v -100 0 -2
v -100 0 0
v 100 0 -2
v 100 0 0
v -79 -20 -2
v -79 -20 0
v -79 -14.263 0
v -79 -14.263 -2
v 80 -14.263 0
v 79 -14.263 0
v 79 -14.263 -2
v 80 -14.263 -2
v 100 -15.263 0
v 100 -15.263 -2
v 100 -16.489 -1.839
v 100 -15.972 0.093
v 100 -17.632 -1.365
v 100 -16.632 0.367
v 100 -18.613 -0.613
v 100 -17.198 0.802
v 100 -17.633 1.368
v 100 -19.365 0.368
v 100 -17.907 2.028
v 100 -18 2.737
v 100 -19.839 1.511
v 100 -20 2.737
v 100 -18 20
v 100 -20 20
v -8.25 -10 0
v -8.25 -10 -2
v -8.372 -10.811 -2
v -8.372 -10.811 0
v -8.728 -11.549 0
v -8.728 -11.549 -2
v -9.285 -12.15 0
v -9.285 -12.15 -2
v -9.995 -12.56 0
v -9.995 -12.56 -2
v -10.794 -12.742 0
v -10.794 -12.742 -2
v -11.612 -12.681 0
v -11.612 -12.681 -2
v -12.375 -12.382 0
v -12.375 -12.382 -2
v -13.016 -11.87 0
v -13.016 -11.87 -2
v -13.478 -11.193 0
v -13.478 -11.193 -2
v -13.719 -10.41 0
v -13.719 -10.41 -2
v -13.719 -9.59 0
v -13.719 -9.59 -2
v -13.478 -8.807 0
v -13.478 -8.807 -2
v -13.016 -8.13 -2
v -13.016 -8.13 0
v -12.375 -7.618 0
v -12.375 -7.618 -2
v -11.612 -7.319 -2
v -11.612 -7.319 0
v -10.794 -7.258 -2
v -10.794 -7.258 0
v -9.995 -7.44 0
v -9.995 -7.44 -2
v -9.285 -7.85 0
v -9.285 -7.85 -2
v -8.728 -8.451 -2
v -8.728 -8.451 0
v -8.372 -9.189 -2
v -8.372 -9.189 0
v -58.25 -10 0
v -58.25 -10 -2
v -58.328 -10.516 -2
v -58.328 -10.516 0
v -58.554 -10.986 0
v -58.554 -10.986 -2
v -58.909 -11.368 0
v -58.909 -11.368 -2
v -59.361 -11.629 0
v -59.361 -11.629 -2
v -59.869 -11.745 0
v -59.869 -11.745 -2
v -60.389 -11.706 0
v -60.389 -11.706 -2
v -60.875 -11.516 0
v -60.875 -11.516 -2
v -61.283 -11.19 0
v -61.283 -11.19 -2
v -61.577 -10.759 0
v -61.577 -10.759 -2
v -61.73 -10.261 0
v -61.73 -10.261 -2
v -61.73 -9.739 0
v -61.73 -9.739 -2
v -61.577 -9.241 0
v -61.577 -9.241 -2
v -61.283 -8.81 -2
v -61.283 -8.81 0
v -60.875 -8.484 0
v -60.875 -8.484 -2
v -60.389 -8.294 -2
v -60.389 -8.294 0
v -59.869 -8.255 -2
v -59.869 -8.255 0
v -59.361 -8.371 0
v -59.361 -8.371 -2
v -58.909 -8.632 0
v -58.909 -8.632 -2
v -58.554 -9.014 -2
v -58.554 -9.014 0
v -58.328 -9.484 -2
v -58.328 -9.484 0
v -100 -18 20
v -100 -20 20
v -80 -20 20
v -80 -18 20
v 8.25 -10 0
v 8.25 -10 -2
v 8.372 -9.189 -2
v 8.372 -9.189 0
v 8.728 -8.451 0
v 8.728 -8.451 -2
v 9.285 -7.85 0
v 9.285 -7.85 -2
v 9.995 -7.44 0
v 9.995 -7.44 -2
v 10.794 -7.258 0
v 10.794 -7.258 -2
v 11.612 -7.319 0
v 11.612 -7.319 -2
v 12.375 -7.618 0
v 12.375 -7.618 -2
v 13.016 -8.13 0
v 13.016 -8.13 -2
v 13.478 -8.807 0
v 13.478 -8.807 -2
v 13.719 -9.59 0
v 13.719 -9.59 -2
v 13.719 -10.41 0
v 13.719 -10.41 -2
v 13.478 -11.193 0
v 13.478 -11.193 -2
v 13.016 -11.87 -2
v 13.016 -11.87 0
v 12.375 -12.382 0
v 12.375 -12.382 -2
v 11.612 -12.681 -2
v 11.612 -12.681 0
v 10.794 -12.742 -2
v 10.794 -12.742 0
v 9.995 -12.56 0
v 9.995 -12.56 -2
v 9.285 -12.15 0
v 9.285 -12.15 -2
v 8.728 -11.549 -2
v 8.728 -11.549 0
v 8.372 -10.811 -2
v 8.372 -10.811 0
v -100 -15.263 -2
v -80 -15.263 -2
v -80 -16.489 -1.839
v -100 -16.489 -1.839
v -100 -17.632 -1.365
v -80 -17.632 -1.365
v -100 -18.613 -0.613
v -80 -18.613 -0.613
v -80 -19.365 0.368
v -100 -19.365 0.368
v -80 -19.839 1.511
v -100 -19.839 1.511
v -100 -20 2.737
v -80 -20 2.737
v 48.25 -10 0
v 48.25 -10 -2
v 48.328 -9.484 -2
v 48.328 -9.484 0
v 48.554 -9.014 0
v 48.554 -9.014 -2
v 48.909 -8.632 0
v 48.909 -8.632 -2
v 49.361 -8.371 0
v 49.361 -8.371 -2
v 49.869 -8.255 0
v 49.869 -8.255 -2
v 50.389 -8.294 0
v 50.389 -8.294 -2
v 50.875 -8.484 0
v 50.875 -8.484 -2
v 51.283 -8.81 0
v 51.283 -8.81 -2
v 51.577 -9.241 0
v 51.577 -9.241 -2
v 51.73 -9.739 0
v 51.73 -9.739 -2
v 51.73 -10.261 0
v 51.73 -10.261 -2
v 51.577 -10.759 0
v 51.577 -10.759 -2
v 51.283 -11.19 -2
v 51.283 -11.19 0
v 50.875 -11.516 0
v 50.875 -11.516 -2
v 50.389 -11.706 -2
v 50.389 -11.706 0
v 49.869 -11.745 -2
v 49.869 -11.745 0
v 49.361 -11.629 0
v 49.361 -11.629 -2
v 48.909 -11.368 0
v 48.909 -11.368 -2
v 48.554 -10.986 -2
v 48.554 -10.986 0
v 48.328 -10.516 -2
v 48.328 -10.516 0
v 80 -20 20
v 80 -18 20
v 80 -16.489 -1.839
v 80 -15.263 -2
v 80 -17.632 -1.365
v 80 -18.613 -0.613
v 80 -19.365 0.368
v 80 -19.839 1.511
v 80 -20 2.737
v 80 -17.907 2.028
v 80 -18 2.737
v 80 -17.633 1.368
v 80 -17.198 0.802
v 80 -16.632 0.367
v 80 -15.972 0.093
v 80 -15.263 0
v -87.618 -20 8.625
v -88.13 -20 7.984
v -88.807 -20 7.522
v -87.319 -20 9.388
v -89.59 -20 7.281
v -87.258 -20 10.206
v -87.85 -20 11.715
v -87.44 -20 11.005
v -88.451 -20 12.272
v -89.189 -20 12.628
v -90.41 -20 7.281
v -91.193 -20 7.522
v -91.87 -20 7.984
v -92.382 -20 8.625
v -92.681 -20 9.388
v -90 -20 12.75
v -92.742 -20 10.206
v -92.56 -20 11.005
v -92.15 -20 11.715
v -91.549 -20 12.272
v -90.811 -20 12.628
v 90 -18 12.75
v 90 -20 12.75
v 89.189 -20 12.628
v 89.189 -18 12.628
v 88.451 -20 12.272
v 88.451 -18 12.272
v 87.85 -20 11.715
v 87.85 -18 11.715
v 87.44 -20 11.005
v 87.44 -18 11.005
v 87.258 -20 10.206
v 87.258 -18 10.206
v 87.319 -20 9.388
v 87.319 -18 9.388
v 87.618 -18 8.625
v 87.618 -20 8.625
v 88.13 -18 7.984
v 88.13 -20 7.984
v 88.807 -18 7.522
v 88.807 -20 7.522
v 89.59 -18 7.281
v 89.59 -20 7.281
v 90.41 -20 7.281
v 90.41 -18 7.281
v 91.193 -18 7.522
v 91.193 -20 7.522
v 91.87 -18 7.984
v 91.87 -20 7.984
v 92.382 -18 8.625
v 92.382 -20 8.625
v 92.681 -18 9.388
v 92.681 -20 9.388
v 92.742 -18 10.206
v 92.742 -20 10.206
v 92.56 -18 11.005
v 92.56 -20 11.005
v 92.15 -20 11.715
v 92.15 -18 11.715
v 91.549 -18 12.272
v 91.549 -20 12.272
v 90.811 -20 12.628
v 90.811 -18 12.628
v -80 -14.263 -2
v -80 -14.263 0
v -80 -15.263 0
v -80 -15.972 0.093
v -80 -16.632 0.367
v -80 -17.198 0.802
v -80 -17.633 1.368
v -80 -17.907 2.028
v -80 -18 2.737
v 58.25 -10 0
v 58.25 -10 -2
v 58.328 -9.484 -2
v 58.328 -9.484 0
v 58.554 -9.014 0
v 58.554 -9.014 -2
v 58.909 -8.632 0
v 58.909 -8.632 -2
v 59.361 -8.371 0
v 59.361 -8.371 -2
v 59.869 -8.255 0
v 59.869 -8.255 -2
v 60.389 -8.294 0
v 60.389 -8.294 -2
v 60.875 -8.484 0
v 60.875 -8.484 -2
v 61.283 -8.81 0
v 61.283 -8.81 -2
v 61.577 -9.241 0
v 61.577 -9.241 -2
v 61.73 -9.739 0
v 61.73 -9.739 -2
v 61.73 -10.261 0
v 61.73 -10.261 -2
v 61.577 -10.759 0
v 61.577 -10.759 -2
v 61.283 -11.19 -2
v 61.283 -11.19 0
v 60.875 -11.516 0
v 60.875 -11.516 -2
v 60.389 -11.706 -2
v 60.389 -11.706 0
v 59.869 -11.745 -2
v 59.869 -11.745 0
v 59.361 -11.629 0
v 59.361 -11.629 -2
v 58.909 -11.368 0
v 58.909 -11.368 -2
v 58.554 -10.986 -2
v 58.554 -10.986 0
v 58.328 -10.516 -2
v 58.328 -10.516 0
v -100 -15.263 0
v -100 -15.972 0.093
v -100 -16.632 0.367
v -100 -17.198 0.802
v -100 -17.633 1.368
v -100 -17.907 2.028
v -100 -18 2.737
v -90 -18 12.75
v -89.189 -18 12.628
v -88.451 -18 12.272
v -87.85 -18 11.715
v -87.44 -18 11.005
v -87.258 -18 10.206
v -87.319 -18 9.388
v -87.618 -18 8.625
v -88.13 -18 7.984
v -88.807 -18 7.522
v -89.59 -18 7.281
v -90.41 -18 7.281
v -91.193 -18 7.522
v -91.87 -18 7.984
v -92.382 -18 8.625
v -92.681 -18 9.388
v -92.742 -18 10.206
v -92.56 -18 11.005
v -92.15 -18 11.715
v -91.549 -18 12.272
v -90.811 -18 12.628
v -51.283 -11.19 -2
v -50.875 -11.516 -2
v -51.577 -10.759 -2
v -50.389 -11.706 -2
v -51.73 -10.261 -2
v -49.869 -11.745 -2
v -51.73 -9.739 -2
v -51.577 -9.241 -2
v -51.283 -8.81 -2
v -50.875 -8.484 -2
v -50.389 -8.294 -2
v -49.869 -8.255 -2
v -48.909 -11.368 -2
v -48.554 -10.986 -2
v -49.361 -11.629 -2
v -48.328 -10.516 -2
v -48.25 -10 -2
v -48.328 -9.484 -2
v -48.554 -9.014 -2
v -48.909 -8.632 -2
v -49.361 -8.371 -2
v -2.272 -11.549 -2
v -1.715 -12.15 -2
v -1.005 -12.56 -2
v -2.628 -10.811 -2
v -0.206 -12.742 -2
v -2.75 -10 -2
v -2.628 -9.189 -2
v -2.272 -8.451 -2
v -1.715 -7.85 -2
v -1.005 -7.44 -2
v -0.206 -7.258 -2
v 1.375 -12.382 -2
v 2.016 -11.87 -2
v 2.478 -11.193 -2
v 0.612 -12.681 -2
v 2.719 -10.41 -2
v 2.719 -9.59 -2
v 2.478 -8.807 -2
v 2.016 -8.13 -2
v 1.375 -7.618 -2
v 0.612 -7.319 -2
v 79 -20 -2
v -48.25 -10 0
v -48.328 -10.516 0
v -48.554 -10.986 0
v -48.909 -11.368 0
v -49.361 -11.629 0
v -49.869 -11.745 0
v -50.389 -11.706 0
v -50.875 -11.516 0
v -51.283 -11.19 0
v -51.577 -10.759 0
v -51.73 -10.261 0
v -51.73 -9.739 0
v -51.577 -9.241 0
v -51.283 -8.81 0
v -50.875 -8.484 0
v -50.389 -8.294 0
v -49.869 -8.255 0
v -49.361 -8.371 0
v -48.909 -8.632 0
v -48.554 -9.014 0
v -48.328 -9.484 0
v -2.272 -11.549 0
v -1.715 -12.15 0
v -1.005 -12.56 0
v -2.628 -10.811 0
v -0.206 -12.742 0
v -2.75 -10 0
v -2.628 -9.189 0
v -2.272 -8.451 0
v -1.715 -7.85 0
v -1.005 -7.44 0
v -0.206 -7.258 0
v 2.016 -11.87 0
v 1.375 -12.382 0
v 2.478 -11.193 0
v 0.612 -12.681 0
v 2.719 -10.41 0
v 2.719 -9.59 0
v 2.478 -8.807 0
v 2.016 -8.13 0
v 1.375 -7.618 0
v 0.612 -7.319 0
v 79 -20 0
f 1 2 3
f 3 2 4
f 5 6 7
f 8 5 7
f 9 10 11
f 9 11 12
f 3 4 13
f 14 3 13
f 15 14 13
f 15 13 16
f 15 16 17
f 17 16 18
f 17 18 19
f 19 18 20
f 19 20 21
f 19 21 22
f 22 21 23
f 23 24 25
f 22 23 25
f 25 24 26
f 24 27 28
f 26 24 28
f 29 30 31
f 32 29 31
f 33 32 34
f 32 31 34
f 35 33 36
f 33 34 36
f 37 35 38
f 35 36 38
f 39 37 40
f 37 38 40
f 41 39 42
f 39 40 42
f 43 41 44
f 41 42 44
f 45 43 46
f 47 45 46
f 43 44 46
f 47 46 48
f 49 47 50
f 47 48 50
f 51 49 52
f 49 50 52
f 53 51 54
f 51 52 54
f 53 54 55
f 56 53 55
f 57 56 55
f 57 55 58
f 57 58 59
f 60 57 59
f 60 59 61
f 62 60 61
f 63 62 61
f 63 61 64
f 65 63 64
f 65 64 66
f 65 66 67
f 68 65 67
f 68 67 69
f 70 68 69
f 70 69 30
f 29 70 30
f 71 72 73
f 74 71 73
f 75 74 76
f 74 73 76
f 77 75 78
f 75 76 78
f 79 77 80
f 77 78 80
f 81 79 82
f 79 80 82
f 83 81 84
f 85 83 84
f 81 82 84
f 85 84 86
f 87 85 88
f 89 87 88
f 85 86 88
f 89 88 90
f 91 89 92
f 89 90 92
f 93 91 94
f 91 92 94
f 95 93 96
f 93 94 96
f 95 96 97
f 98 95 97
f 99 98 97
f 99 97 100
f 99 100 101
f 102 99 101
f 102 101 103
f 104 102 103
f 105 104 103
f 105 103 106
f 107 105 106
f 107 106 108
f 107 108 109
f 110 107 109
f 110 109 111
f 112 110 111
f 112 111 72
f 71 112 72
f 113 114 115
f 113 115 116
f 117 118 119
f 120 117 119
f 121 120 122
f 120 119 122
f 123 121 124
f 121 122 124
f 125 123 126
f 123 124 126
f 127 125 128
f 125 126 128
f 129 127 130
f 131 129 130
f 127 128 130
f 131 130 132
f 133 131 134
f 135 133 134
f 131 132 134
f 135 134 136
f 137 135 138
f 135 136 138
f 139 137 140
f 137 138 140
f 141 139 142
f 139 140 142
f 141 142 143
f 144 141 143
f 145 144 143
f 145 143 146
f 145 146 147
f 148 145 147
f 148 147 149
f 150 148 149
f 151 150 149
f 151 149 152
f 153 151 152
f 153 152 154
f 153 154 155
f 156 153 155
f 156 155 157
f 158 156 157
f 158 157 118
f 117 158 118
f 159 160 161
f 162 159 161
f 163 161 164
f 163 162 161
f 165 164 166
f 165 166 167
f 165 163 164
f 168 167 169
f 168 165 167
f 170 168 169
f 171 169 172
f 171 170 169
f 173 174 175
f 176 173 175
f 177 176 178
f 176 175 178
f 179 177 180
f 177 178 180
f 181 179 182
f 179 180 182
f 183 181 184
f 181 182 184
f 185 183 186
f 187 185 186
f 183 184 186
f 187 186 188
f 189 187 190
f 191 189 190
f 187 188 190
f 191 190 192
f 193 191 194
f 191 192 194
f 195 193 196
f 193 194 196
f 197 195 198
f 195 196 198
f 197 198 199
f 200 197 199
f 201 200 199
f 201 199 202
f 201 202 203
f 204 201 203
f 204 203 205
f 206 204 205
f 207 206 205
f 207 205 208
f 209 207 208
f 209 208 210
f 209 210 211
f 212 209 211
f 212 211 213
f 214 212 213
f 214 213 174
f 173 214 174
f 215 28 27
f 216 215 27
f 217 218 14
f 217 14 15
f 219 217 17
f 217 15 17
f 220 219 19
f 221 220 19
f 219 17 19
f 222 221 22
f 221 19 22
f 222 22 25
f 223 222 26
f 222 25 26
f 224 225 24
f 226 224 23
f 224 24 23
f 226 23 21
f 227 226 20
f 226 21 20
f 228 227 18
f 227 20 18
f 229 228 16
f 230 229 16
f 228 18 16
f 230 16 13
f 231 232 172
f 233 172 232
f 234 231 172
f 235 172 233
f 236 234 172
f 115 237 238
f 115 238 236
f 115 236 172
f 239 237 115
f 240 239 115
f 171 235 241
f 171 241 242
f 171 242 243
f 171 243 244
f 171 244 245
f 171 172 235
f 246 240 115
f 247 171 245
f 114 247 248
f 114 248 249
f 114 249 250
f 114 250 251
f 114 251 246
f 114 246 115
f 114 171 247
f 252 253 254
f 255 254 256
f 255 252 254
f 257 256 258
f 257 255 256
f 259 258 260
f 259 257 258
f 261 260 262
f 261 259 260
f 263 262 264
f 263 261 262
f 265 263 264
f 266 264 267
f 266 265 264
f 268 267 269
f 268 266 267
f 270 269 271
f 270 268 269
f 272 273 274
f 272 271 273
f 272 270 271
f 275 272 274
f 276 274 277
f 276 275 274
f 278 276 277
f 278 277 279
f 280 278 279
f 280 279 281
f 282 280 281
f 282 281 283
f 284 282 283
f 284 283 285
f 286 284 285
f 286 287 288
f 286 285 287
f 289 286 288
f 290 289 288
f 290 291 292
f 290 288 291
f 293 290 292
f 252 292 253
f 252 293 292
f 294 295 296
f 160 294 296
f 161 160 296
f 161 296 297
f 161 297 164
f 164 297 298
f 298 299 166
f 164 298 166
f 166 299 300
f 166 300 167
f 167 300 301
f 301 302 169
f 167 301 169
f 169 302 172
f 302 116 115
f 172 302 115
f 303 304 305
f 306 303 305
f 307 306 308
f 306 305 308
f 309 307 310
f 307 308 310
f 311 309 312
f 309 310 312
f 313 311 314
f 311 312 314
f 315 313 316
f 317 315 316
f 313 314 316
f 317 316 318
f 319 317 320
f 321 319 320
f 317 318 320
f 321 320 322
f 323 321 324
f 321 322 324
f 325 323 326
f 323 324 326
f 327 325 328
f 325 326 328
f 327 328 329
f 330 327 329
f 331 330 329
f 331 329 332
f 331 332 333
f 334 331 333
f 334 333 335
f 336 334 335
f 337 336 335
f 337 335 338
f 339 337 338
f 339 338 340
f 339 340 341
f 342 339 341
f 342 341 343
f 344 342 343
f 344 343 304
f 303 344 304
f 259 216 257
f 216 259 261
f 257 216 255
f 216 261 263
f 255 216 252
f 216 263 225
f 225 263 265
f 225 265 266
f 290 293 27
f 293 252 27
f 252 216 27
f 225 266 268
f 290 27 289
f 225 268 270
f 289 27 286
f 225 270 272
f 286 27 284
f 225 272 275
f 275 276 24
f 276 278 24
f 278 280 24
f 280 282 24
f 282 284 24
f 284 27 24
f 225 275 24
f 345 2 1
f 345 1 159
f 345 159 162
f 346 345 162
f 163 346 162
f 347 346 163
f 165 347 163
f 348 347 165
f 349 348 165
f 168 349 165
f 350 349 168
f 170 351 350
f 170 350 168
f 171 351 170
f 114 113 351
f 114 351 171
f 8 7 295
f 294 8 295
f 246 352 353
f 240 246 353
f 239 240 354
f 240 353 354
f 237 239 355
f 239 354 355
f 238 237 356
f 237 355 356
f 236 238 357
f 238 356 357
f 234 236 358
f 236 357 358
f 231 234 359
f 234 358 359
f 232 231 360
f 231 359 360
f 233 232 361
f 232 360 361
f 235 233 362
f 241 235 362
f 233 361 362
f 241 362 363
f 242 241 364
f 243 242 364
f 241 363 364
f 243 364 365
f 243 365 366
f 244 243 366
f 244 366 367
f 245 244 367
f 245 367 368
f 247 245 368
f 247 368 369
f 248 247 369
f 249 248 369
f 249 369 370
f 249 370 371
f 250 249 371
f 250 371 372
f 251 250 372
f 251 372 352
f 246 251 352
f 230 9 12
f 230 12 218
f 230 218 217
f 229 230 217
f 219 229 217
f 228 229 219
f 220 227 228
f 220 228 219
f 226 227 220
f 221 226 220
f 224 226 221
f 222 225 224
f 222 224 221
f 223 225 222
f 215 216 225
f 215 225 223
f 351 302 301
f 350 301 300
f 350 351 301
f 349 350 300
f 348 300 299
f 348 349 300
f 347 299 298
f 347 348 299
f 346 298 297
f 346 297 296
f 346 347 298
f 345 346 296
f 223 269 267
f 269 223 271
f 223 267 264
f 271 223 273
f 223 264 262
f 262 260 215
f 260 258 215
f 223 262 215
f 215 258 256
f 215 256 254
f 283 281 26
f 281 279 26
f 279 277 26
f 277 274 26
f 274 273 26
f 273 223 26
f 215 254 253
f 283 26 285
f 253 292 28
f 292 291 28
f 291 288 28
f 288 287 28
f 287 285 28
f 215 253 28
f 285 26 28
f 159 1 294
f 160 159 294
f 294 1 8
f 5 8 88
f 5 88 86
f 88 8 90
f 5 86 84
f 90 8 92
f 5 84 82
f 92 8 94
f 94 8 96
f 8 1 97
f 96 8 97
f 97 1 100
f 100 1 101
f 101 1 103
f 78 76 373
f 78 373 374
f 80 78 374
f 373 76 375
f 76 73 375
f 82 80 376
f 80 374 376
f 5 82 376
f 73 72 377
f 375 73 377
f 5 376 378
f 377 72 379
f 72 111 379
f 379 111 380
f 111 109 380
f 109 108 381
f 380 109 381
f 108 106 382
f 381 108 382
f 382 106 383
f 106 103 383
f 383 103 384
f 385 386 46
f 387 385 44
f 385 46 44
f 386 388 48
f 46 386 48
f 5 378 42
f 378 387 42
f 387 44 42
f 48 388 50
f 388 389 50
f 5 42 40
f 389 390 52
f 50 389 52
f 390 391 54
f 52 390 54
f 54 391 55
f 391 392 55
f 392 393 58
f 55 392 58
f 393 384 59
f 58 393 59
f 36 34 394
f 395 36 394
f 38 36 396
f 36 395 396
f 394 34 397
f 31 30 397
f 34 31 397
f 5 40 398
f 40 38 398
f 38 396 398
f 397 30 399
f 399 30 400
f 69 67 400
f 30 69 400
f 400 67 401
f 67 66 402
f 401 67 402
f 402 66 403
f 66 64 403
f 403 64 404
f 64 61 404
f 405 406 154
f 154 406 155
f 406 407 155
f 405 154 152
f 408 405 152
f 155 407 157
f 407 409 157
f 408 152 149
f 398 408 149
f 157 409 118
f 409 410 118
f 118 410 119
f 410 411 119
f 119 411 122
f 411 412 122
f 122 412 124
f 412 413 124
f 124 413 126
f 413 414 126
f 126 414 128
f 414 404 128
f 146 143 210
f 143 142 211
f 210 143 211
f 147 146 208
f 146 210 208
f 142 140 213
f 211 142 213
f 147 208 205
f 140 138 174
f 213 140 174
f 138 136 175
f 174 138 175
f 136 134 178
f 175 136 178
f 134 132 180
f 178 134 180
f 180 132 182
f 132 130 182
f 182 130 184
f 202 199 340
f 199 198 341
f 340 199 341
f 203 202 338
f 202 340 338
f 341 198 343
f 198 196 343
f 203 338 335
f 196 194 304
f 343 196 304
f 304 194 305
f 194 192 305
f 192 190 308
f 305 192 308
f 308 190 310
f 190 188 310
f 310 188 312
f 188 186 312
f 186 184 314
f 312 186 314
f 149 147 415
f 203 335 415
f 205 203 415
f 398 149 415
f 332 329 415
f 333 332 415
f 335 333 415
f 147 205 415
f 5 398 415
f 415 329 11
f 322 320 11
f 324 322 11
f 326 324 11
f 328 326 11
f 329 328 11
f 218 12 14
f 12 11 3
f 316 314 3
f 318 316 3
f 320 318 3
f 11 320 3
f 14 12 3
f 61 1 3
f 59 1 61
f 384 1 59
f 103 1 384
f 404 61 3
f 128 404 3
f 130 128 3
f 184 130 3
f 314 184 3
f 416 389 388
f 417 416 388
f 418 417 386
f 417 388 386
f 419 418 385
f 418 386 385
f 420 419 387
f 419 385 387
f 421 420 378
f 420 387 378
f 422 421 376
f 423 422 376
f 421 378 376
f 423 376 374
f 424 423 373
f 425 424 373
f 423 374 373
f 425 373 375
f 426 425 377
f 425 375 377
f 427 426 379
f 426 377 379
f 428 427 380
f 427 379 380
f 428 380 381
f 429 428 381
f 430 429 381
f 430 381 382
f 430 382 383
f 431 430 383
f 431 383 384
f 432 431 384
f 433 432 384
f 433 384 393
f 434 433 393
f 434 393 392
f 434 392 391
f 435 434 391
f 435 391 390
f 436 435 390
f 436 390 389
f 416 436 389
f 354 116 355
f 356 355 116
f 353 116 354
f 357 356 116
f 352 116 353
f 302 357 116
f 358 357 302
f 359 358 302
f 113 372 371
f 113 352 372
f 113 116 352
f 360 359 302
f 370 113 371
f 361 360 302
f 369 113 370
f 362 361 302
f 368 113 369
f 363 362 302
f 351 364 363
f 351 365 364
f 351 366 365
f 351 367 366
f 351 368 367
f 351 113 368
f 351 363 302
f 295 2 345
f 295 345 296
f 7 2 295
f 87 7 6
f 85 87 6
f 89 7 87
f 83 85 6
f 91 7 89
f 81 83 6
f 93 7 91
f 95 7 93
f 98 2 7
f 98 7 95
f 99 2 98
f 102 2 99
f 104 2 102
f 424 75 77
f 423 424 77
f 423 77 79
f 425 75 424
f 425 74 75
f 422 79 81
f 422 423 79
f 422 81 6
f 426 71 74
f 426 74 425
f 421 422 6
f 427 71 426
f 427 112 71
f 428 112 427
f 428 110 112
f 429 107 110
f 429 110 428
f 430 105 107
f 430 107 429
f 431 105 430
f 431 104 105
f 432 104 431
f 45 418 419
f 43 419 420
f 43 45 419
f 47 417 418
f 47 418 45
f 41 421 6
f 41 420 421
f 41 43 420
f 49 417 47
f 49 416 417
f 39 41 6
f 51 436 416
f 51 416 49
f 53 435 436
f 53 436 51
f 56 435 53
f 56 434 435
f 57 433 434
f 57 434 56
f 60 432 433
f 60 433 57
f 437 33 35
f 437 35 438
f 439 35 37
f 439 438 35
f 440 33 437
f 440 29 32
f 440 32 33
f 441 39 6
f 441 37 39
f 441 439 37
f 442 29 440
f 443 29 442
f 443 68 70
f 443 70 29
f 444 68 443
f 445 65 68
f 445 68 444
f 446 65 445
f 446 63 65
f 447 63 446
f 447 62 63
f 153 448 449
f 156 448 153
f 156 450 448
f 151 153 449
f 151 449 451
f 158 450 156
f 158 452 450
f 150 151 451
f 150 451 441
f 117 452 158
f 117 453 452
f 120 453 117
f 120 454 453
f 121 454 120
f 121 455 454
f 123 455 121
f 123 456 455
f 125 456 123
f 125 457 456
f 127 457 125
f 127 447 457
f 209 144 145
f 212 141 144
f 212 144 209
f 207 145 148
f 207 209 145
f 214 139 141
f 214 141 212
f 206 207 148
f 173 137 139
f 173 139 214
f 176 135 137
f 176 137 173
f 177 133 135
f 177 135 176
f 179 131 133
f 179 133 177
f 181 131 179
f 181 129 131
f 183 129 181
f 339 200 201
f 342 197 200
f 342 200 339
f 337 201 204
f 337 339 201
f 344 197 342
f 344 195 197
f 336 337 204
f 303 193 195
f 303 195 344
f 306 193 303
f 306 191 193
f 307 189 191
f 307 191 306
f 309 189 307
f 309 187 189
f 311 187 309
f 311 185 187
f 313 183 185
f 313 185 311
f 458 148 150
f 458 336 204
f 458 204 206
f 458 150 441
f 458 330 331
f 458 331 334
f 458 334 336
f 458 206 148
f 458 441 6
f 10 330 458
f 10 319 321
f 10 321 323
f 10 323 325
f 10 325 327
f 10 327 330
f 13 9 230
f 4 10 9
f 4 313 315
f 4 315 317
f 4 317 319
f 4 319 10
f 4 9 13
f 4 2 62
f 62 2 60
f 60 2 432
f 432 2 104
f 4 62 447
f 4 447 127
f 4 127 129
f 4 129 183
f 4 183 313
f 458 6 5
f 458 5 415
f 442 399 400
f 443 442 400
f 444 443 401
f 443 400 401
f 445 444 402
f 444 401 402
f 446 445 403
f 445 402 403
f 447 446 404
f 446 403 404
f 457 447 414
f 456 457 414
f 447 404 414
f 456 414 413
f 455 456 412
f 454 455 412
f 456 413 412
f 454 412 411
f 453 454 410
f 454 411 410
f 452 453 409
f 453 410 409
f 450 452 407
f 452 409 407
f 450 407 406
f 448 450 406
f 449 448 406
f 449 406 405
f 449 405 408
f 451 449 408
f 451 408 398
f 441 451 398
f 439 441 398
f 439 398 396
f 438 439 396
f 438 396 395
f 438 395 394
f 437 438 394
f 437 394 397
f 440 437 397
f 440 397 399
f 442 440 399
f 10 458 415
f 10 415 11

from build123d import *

# Parameters (mm, degrees)
SKETCH_1_W                        = 200
SKETCH_1_H                        = 20
SM_BASE_FLANGE_1_DEPTH            = 2
SM_EDGE_FLANGE_1_STRIP_W          = 13.4732
SM_EDGE_FLANGE_1_STRIP_H          = 2
SM_EDGE_FLANGE_1_STRIP_CUT_DEPTH  = 20
SM_EDGE_FLANGE_1_RELIEF_W         = 14.4732
SM_EDGE_FLANGE_1_RELIEF_H         = 1
SM_EDGE_FLANGE_1_RELIEF_CUT_DEPTH = 2
SM_EDGE_FLANGE_1_DEPTH            = 20
SKETCH_10_R                       = 2.75
CUT_EXTRUDE_2_DEPTH               = 10
SKETCH_11_R                       = 2.75
SKETCH_11_R_2                     = 1.75
CUT_EXTRUDE_3_DEPTH               = 10


# Sheet-metal steps are written as plain solids
with BuildPart() as part:
    # Sketch 1 → 基体-法兰1 (new body)
    with BuildSketch(Plane.XY):
        with Locations((0, -10)):
            Rectangle(SKETCH_1_W, SKETCH_1_H)
    extrude(amount=-SM_BASE_FLANGE_1_DEPTH)

    # 边线-法兰1 strip (across the edge) → 边线-法兰1 strip cut (cut)
    with BuildSketch(Plane(origin=(-100, -20, 0), x_dir=(0, 1, 0), z_dir=(1, 0, 0))):
        with Locations((-2, -1)):
            Rectangle(SM_EDGE_FLANGE_1_STRIP_W, SM_EDGE_FLANGE_1_STRIP_H)
    sm_edge_flange_1_strip_cut = extrude(amount=SM_EDGE_FLANGE_1_STRIP_CUT_DEPTH, mode=Mode.SUBTRACT)

    # 边线-法兰1 relief (on the sheet) → 边线-法兰1 relief cut (cut)
    with BuildSketch(Plane(origin=(-100, -15.2634, 0), x_dir=(0, 1, 0), z_dir=(0, 0, 1))):
        with Locations((-6.2366, -20.5)):
            Rectangle(SM_EDGE_FLANGE_1_RELIEF_W, SM_EDGE_FLANGE_1_RELIEF_H)
    sm_edge_flange_1_relief_cut = extrude(amount=-SM_EDGE_FLANGE_1_RELIEF_CUT_DEPTH, mode=Mode.SUBTRACT)

    # 边线-法兰1 section (across the edge) → 边线-法兰1 (add)
    with BuildSketch(Plane(origin=(-100, -20, 0), x_dir=(0, 1, 0), z_dir=(1, 0, 0))):
        with BuildLine():
            Line((0, 2.7366), (0, 20))
            Line((0, 20), (2, 20))
            Line((2, 20), (2, 2.7366))
            ThreePointArc((2, 2.7366), (2.801531583, 0.801531583), (4.7366, 0))
            Line((4.7366, 0), (4.7366, -2))
            ThreePointArc((4.7366, -2), (1.38731802, -0.61268198), (0, 2.7366))
        make_face()
    sm_edge_flange_1 = extrude(amount=SM_EDGE_FLANGE_1_DEPTH)

    # 草图10 → 切除-拉伸2 (cut)
    with BuildSketch(Plane(origin=(0, -18, 0), x_dir=(1, 0, 0), z_dir=(0, 1, 0))):
        with Locations(Location((-90, -10, 0), (0, 0, 270))):
            Circle(SKETCH_10_R)
    cut_extrude_2 = extrude(amount=-CUT_EXTRUDE_2_DEPTH, mode=Mode.SUBTRACT)

    # 镜向1: 边线-法兰1 strip cut, 边线-法兰1 relief cut, 边线-法兰1, 切除-拉伸2 across plane
    add(sm_edge_flange_1_strip_cut.mirror(Plane(origin=(0, 0, 0), x_dir=(0, 0, 1), z_dir=(1, 0, 0))), mode=Mode.SUBTRACT)
    add(sm_edge_flange_1_relief_cut.mirror(Plane(origin=(0, 0, 0), x_dir=(0, 0, 1), z_dir=(1, 0, 0))), mode=Mode.SUBTRACT)
    add(sm_edge_flange_1.mirror(Plane(origin=(0, 0, 0), x_dir=(0, 0, 1), z_dir=(1, 0, 0))))
    add(cut_extrude_2.mirror(Plane(origin=(0, 0, 0), x_dir=(0, 0, 1), z_dir=(1, 0, 0))), mode=Mode.SUBTRACT)

    # 草图11 → 切除-拉伸3 (cut)
    with BuildSketch(Plane(origin=(0, 0, -2), x_dir=(-1, 0, 0), z_dir=(0, 0, -1))):
        with Locations((0, -10)):
            Circle(SKETCH_11_R)
        with Locations((-11, -10)):
            Circle(SKETCH_11_R)
        with Locations(Location((11, -10, 0), (0, 0, 180))):
            Circle(SKETCH_11_R)
        with Locations((-60, -10)):
            Circle(SKETCH_11_R_2)
        with Locations((-50, -10)):
            Circle(SKETCH_11_R_2)
        with Locations(Location((60, -10, 0), (0, 0, 180))):
            Circle(SKETCH_11_R_2)
        with Locations(Location((50, -10, 0), (0, 0, 180))):
            Circle(SKETCH_11_R_2)
    extrude(amount=-CUT_EXTRUDE_3_DEPTH, mode=Mode.SUBTRACT)


solid = part.part
